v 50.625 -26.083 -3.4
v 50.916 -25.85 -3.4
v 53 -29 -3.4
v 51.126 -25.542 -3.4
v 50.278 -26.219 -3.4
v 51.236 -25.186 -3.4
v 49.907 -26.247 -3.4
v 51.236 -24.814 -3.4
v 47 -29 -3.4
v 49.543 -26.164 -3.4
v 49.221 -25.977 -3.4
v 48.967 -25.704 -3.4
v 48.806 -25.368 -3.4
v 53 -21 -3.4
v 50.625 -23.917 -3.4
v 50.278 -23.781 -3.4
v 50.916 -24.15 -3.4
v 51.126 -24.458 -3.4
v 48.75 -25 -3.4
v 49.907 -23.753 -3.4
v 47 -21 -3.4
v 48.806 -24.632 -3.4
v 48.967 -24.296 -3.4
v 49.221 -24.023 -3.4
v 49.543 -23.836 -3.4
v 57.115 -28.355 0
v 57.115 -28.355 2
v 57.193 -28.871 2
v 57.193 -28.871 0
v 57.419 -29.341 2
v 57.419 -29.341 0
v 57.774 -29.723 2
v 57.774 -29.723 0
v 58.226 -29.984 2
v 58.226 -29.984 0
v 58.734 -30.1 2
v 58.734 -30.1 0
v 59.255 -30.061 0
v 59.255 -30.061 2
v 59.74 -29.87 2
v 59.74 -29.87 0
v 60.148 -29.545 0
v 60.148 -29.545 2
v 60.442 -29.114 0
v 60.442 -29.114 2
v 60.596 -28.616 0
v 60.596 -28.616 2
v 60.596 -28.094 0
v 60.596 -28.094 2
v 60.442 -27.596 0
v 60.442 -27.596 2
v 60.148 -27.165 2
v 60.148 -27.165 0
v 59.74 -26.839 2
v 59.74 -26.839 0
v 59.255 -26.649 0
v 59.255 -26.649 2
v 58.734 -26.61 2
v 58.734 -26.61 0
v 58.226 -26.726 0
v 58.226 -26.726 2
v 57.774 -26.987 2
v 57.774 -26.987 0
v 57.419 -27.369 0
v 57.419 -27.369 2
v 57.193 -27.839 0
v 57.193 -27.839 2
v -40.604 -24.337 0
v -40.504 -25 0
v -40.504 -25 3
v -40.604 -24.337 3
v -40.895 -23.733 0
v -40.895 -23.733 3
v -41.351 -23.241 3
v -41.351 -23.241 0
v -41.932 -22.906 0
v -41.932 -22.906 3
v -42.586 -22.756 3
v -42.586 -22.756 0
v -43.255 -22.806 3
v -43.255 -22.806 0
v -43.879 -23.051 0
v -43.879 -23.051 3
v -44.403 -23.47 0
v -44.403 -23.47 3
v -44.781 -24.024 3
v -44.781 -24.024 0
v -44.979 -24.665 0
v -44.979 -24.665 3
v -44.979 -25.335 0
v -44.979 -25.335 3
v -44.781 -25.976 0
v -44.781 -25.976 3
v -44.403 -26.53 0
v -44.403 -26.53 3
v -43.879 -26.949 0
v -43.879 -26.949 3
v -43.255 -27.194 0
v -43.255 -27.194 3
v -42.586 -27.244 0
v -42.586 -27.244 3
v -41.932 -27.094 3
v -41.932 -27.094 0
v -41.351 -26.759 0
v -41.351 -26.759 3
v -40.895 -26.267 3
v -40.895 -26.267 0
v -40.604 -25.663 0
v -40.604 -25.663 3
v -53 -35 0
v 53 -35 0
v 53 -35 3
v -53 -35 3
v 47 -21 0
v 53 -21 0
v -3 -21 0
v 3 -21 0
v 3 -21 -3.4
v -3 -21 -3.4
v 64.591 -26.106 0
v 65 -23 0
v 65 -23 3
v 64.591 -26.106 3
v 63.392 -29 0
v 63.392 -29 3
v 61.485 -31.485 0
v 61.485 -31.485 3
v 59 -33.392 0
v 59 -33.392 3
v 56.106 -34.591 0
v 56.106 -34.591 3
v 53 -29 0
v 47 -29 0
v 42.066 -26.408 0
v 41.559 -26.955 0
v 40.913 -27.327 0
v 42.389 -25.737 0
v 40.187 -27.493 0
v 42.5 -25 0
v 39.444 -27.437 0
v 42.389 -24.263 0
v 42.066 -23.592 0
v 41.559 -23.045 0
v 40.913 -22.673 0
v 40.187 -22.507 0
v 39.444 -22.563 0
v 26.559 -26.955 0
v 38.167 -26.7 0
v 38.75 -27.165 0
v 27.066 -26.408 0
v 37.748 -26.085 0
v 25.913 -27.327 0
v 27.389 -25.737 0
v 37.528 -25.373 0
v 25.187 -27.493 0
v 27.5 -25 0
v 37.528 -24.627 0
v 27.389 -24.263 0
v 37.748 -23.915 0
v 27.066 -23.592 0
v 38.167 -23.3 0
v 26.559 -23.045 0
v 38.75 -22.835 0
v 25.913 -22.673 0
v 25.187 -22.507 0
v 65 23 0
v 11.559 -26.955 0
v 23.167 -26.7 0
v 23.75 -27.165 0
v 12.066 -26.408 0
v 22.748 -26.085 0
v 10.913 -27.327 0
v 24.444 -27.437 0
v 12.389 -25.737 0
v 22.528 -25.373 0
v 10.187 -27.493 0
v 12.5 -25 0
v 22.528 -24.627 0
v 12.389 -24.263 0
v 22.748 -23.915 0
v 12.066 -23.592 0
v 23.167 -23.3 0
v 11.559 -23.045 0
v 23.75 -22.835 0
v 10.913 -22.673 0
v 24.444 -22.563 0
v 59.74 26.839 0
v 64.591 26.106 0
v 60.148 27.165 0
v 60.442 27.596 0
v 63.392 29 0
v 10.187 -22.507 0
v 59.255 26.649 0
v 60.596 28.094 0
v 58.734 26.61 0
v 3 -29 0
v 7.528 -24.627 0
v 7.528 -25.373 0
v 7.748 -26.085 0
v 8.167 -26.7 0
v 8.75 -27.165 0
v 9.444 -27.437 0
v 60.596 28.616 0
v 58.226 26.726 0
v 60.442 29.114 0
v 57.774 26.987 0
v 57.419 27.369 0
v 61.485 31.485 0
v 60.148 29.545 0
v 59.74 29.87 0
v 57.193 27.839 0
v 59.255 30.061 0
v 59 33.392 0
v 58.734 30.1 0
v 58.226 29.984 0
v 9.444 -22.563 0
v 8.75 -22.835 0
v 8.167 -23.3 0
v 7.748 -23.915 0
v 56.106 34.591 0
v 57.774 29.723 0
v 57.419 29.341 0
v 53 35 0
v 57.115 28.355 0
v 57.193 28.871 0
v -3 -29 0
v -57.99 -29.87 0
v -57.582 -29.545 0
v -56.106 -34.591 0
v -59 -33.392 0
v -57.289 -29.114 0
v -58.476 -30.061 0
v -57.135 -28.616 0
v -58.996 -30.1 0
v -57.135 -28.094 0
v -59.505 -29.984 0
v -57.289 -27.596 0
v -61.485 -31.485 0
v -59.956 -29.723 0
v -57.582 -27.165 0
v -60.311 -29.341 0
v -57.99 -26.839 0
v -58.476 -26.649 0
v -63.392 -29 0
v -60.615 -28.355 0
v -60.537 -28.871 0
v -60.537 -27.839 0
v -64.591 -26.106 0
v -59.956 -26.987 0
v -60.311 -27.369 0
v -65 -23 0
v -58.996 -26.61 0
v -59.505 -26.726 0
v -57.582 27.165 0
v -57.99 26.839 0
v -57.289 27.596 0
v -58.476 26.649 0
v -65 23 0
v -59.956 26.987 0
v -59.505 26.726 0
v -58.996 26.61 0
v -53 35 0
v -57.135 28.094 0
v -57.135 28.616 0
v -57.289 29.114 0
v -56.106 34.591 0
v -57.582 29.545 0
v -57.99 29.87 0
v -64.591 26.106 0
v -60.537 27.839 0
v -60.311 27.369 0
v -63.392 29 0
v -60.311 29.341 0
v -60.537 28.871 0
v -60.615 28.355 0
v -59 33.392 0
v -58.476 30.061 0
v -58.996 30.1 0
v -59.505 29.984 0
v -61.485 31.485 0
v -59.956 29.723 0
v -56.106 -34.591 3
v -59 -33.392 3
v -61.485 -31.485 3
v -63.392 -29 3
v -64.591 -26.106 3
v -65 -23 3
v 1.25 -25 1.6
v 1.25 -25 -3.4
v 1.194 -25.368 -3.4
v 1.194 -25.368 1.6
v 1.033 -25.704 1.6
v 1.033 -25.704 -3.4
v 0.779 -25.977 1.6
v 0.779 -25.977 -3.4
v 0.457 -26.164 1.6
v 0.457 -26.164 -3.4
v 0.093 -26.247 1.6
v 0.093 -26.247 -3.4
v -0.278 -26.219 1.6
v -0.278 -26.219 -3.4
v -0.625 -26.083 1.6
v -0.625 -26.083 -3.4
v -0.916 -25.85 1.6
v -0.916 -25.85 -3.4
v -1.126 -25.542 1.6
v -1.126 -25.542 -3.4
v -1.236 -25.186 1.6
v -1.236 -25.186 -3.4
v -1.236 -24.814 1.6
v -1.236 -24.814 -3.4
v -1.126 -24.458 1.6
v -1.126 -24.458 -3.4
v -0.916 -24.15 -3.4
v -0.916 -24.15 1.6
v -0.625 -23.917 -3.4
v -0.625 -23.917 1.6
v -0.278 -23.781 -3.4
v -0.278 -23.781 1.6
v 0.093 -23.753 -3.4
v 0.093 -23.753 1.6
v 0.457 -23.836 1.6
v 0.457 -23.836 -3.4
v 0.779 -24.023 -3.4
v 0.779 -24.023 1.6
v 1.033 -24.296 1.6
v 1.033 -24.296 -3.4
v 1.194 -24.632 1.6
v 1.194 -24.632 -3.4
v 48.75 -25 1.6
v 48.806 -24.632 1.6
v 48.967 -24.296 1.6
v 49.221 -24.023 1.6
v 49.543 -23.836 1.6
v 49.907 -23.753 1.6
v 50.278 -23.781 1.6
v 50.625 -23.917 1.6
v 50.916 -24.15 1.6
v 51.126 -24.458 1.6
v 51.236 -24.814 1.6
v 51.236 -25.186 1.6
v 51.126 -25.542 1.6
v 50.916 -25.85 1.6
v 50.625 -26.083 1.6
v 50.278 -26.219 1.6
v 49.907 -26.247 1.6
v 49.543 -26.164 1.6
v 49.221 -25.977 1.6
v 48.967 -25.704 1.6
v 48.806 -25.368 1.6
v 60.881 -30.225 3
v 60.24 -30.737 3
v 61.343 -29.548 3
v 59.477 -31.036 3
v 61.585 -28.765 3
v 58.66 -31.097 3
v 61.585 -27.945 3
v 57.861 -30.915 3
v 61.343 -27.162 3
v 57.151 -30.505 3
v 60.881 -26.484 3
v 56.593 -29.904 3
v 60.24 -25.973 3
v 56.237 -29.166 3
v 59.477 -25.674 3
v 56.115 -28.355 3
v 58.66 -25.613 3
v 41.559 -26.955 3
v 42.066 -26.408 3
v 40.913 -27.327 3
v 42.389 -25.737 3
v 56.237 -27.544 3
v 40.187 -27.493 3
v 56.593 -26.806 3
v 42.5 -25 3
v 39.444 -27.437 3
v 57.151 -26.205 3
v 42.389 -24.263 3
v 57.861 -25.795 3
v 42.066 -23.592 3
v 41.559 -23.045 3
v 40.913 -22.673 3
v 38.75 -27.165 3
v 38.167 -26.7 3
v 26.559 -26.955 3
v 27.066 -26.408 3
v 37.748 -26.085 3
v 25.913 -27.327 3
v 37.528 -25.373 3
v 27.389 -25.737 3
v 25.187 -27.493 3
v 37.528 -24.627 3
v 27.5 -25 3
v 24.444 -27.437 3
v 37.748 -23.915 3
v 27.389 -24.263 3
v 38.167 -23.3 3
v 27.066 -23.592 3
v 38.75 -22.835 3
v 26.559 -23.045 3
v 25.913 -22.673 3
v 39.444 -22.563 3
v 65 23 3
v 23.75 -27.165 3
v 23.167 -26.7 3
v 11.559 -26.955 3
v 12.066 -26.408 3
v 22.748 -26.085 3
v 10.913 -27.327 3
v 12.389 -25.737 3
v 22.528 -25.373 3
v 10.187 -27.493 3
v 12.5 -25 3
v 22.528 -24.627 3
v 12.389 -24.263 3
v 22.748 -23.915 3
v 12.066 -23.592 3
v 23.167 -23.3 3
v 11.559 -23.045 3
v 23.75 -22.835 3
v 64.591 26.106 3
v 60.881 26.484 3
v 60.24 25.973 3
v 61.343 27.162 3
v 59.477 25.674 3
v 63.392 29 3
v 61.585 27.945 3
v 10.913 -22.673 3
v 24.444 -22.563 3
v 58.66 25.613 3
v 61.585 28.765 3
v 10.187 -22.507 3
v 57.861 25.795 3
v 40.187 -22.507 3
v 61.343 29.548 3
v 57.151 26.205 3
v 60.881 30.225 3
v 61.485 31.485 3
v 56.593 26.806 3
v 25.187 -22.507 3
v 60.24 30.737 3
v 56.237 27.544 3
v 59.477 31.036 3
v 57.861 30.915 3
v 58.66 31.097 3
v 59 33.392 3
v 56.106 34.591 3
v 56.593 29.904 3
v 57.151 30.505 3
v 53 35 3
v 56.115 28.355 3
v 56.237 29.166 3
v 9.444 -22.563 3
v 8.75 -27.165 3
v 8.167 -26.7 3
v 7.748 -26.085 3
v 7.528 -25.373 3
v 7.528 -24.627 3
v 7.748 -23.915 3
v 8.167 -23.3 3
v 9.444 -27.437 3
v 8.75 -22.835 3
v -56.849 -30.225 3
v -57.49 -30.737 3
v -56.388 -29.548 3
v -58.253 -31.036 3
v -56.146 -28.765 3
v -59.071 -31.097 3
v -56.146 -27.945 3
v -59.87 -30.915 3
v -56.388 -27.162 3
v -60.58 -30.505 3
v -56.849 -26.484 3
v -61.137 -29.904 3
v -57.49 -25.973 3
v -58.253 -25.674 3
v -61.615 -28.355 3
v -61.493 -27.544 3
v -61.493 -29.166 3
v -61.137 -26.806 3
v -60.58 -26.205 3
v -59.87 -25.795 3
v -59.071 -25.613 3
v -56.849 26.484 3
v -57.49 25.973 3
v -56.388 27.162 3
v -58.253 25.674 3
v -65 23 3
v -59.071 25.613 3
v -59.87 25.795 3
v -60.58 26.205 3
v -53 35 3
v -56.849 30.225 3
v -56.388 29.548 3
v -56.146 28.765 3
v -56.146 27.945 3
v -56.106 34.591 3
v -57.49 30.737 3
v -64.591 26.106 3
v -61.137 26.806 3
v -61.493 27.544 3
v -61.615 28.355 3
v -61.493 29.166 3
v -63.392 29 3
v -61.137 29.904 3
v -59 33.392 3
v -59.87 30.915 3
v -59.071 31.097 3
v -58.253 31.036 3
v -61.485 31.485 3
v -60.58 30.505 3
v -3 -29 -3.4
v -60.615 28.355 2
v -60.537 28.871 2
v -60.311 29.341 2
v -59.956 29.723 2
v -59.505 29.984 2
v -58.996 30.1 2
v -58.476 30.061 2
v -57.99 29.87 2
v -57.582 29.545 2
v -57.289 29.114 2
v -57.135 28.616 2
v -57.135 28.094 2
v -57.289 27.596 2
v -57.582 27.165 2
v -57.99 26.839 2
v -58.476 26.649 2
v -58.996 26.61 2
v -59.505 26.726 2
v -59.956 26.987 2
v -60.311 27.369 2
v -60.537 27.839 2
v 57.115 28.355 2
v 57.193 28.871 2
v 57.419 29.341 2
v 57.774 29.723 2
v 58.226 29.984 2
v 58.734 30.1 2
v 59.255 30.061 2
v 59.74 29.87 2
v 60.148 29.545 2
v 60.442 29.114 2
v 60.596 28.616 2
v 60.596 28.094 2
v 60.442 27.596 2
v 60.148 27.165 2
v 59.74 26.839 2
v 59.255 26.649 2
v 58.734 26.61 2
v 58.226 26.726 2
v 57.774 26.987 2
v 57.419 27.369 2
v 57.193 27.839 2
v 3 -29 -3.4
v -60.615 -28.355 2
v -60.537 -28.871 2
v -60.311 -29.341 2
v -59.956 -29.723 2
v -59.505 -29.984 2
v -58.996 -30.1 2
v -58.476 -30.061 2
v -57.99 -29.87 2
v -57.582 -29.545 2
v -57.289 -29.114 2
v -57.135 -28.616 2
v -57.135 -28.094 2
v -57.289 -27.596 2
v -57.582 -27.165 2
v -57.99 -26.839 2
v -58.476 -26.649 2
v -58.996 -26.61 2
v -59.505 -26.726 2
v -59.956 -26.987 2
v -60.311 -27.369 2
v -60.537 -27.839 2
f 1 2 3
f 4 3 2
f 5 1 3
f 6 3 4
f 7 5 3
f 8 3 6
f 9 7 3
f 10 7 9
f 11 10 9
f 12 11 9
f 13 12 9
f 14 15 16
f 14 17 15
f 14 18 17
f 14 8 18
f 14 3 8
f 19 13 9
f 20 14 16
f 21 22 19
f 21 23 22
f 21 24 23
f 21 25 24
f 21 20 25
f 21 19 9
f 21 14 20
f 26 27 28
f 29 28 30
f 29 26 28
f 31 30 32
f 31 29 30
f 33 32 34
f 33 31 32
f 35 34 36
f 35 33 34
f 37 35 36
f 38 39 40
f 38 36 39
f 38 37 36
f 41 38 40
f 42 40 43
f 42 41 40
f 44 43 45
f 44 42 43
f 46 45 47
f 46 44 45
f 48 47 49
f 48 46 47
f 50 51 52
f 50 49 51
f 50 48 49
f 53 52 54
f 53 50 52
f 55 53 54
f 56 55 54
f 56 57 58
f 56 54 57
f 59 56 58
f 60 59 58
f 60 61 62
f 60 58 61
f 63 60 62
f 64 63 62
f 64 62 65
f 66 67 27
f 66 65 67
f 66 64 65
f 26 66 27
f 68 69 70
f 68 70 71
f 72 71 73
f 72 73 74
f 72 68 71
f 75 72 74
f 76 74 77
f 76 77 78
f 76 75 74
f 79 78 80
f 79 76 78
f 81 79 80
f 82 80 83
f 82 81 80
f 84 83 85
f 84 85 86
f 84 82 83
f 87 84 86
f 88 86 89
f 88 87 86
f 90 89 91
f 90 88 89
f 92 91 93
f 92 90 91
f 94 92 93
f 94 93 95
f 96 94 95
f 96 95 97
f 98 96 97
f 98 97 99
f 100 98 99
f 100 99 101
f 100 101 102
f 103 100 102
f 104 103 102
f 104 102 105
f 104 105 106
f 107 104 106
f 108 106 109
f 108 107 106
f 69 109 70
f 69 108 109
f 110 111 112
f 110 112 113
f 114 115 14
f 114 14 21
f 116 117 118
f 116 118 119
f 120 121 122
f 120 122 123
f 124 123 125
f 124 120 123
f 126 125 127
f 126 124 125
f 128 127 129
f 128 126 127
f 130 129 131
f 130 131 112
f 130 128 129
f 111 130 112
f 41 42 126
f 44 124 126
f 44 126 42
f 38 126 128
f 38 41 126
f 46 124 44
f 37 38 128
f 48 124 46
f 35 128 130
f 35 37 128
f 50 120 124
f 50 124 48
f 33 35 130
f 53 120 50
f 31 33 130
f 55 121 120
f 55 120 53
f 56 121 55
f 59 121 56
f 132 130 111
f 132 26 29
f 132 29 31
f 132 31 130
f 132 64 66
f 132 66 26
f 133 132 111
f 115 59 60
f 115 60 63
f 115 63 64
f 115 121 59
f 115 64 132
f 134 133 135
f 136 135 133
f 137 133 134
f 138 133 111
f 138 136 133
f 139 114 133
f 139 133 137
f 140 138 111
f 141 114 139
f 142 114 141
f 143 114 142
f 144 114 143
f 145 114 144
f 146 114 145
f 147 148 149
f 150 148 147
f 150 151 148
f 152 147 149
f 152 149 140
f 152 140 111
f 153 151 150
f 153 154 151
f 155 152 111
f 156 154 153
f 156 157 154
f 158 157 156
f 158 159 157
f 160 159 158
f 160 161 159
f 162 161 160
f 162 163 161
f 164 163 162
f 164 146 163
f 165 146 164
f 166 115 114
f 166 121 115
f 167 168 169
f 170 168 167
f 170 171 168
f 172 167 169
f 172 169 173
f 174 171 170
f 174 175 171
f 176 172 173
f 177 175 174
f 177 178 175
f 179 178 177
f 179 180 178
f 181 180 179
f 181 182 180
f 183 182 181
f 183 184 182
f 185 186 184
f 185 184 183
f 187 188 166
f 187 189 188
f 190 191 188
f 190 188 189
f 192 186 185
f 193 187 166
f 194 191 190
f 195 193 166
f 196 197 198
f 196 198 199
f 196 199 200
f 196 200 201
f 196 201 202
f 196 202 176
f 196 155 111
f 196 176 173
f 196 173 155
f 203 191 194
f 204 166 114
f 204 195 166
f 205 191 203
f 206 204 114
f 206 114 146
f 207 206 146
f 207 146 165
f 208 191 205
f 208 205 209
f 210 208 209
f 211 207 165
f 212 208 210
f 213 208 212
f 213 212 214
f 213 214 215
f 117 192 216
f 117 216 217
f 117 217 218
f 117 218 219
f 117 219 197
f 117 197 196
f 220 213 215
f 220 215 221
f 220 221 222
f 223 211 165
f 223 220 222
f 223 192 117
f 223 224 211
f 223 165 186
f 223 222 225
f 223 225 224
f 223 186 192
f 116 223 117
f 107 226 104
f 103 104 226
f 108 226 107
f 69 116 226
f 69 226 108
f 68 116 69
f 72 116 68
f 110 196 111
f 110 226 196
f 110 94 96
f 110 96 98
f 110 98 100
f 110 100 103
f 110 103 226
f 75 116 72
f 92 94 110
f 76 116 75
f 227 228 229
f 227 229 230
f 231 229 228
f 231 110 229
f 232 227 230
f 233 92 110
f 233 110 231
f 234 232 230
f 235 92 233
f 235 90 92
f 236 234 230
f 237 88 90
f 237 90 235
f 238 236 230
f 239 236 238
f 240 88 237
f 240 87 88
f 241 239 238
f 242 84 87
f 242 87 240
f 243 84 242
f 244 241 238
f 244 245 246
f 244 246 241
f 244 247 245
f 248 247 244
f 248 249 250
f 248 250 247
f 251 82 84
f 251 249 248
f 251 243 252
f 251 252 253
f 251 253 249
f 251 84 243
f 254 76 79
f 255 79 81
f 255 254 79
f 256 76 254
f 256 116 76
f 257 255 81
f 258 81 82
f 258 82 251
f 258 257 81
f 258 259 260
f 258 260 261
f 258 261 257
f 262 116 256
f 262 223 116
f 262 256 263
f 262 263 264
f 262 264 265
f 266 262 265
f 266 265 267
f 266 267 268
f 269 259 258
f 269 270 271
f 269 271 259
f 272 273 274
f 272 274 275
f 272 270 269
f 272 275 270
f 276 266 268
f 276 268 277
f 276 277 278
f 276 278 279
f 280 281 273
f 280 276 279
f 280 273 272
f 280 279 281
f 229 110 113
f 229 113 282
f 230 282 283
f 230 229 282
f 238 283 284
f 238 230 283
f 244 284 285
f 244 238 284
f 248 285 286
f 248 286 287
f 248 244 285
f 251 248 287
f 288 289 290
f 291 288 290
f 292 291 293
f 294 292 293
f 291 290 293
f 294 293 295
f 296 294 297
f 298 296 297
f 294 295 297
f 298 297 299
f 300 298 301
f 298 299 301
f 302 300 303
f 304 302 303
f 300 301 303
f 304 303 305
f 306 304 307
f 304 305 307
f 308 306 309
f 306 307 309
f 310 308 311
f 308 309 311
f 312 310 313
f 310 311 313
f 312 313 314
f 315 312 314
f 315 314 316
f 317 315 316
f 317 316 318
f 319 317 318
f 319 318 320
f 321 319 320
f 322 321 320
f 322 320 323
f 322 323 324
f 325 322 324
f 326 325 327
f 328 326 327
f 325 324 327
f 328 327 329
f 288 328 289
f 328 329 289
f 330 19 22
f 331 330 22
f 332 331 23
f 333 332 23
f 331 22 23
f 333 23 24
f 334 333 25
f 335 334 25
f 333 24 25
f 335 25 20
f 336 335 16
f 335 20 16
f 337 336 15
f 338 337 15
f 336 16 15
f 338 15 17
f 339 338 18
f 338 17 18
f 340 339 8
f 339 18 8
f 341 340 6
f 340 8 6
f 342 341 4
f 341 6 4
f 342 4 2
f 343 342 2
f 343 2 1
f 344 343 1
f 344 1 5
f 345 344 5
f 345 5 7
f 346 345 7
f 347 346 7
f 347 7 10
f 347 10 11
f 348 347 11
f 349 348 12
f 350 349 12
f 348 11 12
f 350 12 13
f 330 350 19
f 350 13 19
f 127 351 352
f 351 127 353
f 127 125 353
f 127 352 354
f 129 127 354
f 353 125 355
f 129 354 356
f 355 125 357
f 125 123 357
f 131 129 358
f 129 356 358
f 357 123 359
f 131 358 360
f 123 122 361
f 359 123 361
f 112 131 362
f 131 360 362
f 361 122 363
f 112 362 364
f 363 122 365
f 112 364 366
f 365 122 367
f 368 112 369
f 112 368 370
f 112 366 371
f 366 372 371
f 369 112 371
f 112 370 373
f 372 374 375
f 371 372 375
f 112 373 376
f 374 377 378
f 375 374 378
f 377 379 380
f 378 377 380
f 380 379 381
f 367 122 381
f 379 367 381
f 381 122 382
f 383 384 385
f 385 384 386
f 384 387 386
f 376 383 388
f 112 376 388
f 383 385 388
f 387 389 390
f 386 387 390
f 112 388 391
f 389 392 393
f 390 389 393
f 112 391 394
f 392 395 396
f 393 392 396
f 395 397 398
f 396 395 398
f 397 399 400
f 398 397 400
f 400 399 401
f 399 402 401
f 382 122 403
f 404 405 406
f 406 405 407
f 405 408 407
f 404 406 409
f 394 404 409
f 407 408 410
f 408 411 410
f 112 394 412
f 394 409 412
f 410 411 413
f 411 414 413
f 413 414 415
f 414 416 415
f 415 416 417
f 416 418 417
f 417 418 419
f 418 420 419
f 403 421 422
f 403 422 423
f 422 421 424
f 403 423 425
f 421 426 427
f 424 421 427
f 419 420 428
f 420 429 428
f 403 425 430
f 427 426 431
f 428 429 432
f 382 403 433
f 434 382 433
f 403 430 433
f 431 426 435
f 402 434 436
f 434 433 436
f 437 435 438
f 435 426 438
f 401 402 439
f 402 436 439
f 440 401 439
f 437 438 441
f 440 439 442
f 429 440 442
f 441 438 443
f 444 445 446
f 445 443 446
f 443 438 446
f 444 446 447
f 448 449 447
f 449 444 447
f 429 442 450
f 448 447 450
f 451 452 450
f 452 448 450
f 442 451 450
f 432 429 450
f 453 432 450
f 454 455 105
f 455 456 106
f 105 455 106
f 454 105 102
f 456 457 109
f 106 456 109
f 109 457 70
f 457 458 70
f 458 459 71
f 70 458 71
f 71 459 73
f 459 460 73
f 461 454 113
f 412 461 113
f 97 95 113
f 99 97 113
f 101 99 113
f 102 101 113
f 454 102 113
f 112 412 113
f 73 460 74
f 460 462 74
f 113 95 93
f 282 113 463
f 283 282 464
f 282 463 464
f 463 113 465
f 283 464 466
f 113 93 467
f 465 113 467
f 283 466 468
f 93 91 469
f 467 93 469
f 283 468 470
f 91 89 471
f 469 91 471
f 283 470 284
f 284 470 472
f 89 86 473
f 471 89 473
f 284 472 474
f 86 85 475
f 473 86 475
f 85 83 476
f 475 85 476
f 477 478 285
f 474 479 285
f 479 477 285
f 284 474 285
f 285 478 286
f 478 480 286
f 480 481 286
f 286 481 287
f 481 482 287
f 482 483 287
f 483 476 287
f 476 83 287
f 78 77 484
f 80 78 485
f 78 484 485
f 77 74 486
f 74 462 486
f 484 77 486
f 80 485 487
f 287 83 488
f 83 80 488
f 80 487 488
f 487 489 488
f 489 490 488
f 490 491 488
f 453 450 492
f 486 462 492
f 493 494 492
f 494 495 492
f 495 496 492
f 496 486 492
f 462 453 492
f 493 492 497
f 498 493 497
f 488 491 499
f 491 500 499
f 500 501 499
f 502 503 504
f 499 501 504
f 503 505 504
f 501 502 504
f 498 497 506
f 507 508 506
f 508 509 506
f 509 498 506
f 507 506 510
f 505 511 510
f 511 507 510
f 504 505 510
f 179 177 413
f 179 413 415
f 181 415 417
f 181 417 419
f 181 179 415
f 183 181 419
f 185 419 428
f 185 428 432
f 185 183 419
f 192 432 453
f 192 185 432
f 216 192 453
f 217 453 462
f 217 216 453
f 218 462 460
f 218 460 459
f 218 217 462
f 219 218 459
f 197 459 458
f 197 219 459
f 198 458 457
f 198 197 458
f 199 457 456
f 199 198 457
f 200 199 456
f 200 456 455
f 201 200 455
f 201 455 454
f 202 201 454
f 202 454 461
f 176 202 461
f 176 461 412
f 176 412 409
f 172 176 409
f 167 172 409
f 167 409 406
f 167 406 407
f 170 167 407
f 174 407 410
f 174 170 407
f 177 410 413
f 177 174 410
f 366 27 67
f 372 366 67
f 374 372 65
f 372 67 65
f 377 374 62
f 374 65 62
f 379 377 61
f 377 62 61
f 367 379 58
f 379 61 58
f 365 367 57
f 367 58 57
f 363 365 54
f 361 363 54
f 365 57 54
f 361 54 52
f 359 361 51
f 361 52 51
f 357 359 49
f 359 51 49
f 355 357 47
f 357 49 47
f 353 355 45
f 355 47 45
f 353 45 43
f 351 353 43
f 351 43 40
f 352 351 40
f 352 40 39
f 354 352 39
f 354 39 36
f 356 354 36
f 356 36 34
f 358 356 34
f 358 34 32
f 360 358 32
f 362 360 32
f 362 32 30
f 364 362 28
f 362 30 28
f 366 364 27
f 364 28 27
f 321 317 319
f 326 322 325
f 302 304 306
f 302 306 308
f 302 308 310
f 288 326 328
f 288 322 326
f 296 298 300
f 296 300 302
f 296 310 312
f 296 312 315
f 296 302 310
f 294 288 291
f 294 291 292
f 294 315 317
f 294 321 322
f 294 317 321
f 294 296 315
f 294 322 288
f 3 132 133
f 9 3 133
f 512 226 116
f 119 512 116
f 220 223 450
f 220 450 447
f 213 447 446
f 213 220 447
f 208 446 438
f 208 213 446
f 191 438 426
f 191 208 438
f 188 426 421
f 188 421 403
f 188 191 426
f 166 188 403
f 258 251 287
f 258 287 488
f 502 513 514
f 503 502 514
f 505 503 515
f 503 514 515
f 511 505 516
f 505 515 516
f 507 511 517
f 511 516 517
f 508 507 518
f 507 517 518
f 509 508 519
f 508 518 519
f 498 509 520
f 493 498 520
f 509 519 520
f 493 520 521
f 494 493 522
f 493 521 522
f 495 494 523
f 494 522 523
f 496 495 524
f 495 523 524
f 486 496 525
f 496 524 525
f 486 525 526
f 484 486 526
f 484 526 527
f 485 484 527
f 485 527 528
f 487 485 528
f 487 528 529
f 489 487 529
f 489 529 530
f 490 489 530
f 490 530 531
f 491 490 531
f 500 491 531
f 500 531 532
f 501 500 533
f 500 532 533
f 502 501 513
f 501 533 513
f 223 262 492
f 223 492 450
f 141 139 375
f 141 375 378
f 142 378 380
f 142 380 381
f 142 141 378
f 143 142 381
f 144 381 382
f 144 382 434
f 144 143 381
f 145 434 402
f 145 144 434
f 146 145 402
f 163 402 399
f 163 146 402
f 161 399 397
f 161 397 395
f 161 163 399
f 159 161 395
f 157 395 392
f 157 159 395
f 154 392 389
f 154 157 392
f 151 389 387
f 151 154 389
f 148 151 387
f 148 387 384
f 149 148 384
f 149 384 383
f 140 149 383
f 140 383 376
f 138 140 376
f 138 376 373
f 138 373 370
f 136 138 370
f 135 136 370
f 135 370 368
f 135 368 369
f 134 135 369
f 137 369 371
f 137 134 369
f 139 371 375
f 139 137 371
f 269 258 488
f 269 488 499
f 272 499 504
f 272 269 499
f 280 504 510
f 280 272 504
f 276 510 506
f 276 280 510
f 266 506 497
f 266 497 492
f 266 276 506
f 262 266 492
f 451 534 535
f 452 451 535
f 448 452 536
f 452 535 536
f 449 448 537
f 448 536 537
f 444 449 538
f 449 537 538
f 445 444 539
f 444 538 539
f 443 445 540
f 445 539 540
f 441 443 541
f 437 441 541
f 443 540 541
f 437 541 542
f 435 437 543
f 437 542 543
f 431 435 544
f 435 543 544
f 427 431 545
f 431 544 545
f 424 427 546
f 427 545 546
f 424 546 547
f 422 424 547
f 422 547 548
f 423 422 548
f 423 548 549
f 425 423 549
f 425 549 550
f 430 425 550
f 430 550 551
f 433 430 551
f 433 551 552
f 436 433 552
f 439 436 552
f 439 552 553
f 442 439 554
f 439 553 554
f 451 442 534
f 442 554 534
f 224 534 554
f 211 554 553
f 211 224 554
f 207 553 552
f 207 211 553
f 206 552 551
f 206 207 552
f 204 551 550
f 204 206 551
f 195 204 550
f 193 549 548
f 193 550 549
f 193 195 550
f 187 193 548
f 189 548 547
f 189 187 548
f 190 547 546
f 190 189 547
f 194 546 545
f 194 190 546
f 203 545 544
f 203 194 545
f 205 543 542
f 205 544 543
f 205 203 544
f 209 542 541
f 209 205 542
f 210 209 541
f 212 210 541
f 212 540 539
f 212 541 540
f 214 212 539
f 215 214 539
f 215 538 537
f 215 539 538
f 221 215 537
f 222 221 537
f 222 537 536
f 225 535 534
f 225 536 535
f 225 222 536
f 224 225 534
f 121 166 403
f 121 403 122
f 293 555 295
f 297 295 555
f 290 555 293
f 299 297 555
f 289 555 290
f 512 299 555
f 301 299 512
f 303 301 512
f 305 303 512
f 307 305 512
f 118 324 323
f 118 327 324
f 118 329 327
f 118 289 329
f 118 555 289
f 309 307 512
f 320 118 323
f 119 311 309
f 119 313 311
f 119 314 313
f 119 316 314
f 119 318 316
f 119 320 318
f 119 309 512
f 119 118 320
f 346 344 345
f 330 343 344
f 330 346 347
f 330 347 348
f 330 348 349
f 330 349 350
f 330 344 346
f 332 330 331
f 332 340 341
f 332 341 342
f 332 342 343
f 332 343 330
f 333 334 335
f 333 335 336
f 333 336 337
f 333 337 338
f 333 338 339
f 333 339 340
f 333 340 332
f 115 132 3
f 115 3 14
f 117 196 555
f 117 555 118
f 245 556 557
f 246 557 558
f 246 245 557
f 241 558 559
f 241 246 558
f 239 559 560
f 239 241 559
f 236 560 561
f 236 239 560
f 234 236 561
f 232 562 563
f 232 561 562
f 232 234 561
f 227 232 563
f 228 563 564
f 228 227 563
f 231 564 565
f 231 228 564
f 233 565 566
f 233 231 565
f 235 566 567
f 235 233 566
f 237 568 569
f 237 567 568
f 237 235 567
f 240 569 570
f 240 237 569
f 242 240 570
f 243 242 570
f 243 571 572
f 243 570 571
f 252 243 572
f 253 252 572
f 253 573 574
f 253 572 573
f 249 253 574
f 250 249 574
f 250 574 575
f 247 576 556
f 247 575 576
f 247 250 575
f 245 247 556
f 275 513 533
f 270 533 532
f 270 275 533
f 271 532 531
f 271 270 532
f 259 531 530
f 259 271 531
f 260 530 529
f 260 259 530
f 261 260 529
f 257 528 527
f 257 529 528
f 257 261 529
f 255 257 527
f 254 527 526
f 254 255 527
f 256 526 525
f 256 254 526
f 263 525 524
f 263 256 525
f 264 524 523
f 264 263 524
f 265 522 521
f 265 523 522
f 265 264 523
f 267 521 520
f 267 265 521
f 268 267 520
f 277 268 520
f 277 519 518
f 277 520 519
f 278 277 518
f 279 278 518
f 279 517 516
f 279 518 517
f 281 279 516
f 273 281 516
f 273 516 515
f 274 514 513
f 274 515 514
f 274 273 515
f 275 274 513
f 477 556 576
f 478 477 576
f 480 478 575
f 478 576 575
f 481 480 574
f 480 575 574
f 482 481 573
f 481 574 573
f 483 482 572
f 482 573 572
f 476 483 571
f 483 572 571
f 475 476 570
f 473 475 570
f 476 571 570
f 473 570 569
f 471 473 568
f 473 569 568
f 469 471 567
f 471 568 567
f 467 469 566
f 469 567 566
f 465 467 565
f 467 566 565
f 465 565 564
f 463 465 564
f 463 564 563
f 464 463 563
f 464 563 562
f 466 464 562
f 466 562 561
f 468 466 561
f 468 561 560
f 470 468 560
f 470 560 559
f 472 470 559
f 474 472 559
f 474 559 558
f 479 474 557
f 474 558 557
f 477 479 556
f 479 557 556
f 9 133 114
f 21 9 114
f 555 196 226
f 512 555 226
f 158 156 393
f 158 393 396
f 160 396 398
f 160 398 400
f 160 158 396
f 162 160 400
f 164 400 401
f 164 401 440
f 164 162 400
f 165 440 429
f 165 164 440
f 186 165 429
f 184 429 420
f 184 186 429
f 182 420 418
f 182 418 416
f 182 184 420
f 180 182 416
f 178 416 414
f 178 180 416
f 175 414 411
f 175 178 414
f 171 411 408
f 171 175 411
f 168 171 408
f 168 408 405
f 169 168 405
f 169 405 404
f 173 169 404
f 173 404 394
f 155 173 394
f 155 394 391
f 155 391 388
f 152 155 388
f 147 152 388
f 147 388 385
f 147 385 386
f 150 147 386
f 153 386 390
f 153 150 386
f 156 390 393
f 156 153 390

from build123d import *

# Parameters (mm, degrees)
SKETCH_2_R               = 2.5
SKETCH_2_R_2             = 2.25
EXTRUDE_1_DEPTH          = 3
SKETCH_3_W               = 6
SKETCH_3_H               = 8
EXTRUDE_2_DEPTH          = 3.4
SKETCH_4_R               = 1.25
CUT_EXTRUDE_1_DEPTH      = 5
CUT_EXTRUDE_2_DEPTH      = 75.101012139
CUT_EXTRUDE_2_DEPTH_BACK = 3
SKETCH_5_R               = 1.75
CHAMFER_1_SIZE           = 1


with BuildPart() as part:
    # Эскиз2 → Бобышка-Вытянуть1 (new body)
    with BuildSketch(Plane.XY):
        with BuildLine():
            Line((-53, 35), (53, 35))
            ThreePointArc((53, 35), (61.485281374, 31.485281374), (65, 23))
            Line((65, 23), (65, -23))
            ThreePointArc((65, -23), (61.485281374, -31.485281374), (53, -35))
            Line((53, -35), (-53, -35))
            ThreePointArc((-53, -35), (-61.485281374, -31.485281374), (-65, -23))
            Line((-65, -23), (-65, 23))
            ThreePointArc((-65, 23), (-61.485281374, 31.485281374), (-53, 35))
        make_face()
        with Locations((10, -25)):
            Circle(SKETCH_2_R, mode=Mode.SUBTRACT)
        with Locations((25, -25)):
            Circle(SKETCH_2_R, mode=Mode.SUBTRACT)
        with Locations((40, -25)):
            Circle(SKETCH_2_R, mode=Mode.SUBTRACT)
        with Locations((-42.754119413, -25)):
            Circle(SKETCH_2_R_2, mode=Mode.SUBTRACT)
    extrude(amount=EXTRUDE_1_DEPTH)

    # Эскиз3 → Бобышка-Вытянуть2 (add)
    with BuildSketch(Plane(origin=(0, 0, 0), x_dir=(-1, 0, 0), z_dir=(0, 0, -1))):
        with Locations((0, -25)):
            Rectangle(SKETCH_3_W, SKETCH_3_H)
        with Locations((-50, -25)):
            Rectangle(SKETCH_3_W, SKETCH_3_H)
    extrude(amount=EXTRUDE_2_DEPTH)

    # Эскиз4 → Вырез-Вытянуть1 (cut)
    with BuildSketch(Plane(origin=(0, 0, -3.4), x_dir=(-1, 0, 0), z_dir=(0, 0, -1))):
        with Locations((-50, -25)):
            Circle(SKETCH_4_R)
        with Locations(Location((0, -25, 0), (0, 0, 180))):
            Circle(SKETCH_4_R)
    extrude(amount=-CUT_EXTRUDE_1_DEPTH, mode=Mode.SUBTRACT)

    # Эскиз5 → Вырез-Вытянуть2 (cut, two sides: drawn at the far end of the back side and taken through both)
    with BuildSketch(Plane.XY.offset(3).offset(-CUT_EXTRUDE_2_DEPTH_BACK)):
        with Locations(Location((-58.865243762, 28.354943792, 0), (0, 0, 180))):
            Circle(SKETCH_5_R)
        with Locations(Location((-58.865243762, -28.354943792, 0), (0, 0, 180))):
            Circle(SKETCH_5_R)
        with Locations(Location((58.865243762, 28.354943792, 0), (0, 0, 180))):
            Circle(SKETCH_5_R)
        with Locations(Location((58.865243762, -28.354943792, 0), (0, 0, 180))):
            Circle(SKETCH_5_R)
    extrude(amount=CUT_EXTRUDE_2_DEPTH + CUT_EXTRUDE_2_DEPTH_BACK, mode=Mode.SUBTRACT)

    # Фаска1
    chamfer_1_edges = [part.edges().sort_by_distance(p)[0] for p in [
        (-57.115243762, -28.354943792, 3),
        (60.615243762, 28.354943792, 3),
        (60.615243762, -28.354943792, 3),
        (-57.115243762, 28.354943792, 3),
    ]]
    chamfer(chamfer_1_edges, length=CHAMFER_1_SIZE)


solid = part.part
